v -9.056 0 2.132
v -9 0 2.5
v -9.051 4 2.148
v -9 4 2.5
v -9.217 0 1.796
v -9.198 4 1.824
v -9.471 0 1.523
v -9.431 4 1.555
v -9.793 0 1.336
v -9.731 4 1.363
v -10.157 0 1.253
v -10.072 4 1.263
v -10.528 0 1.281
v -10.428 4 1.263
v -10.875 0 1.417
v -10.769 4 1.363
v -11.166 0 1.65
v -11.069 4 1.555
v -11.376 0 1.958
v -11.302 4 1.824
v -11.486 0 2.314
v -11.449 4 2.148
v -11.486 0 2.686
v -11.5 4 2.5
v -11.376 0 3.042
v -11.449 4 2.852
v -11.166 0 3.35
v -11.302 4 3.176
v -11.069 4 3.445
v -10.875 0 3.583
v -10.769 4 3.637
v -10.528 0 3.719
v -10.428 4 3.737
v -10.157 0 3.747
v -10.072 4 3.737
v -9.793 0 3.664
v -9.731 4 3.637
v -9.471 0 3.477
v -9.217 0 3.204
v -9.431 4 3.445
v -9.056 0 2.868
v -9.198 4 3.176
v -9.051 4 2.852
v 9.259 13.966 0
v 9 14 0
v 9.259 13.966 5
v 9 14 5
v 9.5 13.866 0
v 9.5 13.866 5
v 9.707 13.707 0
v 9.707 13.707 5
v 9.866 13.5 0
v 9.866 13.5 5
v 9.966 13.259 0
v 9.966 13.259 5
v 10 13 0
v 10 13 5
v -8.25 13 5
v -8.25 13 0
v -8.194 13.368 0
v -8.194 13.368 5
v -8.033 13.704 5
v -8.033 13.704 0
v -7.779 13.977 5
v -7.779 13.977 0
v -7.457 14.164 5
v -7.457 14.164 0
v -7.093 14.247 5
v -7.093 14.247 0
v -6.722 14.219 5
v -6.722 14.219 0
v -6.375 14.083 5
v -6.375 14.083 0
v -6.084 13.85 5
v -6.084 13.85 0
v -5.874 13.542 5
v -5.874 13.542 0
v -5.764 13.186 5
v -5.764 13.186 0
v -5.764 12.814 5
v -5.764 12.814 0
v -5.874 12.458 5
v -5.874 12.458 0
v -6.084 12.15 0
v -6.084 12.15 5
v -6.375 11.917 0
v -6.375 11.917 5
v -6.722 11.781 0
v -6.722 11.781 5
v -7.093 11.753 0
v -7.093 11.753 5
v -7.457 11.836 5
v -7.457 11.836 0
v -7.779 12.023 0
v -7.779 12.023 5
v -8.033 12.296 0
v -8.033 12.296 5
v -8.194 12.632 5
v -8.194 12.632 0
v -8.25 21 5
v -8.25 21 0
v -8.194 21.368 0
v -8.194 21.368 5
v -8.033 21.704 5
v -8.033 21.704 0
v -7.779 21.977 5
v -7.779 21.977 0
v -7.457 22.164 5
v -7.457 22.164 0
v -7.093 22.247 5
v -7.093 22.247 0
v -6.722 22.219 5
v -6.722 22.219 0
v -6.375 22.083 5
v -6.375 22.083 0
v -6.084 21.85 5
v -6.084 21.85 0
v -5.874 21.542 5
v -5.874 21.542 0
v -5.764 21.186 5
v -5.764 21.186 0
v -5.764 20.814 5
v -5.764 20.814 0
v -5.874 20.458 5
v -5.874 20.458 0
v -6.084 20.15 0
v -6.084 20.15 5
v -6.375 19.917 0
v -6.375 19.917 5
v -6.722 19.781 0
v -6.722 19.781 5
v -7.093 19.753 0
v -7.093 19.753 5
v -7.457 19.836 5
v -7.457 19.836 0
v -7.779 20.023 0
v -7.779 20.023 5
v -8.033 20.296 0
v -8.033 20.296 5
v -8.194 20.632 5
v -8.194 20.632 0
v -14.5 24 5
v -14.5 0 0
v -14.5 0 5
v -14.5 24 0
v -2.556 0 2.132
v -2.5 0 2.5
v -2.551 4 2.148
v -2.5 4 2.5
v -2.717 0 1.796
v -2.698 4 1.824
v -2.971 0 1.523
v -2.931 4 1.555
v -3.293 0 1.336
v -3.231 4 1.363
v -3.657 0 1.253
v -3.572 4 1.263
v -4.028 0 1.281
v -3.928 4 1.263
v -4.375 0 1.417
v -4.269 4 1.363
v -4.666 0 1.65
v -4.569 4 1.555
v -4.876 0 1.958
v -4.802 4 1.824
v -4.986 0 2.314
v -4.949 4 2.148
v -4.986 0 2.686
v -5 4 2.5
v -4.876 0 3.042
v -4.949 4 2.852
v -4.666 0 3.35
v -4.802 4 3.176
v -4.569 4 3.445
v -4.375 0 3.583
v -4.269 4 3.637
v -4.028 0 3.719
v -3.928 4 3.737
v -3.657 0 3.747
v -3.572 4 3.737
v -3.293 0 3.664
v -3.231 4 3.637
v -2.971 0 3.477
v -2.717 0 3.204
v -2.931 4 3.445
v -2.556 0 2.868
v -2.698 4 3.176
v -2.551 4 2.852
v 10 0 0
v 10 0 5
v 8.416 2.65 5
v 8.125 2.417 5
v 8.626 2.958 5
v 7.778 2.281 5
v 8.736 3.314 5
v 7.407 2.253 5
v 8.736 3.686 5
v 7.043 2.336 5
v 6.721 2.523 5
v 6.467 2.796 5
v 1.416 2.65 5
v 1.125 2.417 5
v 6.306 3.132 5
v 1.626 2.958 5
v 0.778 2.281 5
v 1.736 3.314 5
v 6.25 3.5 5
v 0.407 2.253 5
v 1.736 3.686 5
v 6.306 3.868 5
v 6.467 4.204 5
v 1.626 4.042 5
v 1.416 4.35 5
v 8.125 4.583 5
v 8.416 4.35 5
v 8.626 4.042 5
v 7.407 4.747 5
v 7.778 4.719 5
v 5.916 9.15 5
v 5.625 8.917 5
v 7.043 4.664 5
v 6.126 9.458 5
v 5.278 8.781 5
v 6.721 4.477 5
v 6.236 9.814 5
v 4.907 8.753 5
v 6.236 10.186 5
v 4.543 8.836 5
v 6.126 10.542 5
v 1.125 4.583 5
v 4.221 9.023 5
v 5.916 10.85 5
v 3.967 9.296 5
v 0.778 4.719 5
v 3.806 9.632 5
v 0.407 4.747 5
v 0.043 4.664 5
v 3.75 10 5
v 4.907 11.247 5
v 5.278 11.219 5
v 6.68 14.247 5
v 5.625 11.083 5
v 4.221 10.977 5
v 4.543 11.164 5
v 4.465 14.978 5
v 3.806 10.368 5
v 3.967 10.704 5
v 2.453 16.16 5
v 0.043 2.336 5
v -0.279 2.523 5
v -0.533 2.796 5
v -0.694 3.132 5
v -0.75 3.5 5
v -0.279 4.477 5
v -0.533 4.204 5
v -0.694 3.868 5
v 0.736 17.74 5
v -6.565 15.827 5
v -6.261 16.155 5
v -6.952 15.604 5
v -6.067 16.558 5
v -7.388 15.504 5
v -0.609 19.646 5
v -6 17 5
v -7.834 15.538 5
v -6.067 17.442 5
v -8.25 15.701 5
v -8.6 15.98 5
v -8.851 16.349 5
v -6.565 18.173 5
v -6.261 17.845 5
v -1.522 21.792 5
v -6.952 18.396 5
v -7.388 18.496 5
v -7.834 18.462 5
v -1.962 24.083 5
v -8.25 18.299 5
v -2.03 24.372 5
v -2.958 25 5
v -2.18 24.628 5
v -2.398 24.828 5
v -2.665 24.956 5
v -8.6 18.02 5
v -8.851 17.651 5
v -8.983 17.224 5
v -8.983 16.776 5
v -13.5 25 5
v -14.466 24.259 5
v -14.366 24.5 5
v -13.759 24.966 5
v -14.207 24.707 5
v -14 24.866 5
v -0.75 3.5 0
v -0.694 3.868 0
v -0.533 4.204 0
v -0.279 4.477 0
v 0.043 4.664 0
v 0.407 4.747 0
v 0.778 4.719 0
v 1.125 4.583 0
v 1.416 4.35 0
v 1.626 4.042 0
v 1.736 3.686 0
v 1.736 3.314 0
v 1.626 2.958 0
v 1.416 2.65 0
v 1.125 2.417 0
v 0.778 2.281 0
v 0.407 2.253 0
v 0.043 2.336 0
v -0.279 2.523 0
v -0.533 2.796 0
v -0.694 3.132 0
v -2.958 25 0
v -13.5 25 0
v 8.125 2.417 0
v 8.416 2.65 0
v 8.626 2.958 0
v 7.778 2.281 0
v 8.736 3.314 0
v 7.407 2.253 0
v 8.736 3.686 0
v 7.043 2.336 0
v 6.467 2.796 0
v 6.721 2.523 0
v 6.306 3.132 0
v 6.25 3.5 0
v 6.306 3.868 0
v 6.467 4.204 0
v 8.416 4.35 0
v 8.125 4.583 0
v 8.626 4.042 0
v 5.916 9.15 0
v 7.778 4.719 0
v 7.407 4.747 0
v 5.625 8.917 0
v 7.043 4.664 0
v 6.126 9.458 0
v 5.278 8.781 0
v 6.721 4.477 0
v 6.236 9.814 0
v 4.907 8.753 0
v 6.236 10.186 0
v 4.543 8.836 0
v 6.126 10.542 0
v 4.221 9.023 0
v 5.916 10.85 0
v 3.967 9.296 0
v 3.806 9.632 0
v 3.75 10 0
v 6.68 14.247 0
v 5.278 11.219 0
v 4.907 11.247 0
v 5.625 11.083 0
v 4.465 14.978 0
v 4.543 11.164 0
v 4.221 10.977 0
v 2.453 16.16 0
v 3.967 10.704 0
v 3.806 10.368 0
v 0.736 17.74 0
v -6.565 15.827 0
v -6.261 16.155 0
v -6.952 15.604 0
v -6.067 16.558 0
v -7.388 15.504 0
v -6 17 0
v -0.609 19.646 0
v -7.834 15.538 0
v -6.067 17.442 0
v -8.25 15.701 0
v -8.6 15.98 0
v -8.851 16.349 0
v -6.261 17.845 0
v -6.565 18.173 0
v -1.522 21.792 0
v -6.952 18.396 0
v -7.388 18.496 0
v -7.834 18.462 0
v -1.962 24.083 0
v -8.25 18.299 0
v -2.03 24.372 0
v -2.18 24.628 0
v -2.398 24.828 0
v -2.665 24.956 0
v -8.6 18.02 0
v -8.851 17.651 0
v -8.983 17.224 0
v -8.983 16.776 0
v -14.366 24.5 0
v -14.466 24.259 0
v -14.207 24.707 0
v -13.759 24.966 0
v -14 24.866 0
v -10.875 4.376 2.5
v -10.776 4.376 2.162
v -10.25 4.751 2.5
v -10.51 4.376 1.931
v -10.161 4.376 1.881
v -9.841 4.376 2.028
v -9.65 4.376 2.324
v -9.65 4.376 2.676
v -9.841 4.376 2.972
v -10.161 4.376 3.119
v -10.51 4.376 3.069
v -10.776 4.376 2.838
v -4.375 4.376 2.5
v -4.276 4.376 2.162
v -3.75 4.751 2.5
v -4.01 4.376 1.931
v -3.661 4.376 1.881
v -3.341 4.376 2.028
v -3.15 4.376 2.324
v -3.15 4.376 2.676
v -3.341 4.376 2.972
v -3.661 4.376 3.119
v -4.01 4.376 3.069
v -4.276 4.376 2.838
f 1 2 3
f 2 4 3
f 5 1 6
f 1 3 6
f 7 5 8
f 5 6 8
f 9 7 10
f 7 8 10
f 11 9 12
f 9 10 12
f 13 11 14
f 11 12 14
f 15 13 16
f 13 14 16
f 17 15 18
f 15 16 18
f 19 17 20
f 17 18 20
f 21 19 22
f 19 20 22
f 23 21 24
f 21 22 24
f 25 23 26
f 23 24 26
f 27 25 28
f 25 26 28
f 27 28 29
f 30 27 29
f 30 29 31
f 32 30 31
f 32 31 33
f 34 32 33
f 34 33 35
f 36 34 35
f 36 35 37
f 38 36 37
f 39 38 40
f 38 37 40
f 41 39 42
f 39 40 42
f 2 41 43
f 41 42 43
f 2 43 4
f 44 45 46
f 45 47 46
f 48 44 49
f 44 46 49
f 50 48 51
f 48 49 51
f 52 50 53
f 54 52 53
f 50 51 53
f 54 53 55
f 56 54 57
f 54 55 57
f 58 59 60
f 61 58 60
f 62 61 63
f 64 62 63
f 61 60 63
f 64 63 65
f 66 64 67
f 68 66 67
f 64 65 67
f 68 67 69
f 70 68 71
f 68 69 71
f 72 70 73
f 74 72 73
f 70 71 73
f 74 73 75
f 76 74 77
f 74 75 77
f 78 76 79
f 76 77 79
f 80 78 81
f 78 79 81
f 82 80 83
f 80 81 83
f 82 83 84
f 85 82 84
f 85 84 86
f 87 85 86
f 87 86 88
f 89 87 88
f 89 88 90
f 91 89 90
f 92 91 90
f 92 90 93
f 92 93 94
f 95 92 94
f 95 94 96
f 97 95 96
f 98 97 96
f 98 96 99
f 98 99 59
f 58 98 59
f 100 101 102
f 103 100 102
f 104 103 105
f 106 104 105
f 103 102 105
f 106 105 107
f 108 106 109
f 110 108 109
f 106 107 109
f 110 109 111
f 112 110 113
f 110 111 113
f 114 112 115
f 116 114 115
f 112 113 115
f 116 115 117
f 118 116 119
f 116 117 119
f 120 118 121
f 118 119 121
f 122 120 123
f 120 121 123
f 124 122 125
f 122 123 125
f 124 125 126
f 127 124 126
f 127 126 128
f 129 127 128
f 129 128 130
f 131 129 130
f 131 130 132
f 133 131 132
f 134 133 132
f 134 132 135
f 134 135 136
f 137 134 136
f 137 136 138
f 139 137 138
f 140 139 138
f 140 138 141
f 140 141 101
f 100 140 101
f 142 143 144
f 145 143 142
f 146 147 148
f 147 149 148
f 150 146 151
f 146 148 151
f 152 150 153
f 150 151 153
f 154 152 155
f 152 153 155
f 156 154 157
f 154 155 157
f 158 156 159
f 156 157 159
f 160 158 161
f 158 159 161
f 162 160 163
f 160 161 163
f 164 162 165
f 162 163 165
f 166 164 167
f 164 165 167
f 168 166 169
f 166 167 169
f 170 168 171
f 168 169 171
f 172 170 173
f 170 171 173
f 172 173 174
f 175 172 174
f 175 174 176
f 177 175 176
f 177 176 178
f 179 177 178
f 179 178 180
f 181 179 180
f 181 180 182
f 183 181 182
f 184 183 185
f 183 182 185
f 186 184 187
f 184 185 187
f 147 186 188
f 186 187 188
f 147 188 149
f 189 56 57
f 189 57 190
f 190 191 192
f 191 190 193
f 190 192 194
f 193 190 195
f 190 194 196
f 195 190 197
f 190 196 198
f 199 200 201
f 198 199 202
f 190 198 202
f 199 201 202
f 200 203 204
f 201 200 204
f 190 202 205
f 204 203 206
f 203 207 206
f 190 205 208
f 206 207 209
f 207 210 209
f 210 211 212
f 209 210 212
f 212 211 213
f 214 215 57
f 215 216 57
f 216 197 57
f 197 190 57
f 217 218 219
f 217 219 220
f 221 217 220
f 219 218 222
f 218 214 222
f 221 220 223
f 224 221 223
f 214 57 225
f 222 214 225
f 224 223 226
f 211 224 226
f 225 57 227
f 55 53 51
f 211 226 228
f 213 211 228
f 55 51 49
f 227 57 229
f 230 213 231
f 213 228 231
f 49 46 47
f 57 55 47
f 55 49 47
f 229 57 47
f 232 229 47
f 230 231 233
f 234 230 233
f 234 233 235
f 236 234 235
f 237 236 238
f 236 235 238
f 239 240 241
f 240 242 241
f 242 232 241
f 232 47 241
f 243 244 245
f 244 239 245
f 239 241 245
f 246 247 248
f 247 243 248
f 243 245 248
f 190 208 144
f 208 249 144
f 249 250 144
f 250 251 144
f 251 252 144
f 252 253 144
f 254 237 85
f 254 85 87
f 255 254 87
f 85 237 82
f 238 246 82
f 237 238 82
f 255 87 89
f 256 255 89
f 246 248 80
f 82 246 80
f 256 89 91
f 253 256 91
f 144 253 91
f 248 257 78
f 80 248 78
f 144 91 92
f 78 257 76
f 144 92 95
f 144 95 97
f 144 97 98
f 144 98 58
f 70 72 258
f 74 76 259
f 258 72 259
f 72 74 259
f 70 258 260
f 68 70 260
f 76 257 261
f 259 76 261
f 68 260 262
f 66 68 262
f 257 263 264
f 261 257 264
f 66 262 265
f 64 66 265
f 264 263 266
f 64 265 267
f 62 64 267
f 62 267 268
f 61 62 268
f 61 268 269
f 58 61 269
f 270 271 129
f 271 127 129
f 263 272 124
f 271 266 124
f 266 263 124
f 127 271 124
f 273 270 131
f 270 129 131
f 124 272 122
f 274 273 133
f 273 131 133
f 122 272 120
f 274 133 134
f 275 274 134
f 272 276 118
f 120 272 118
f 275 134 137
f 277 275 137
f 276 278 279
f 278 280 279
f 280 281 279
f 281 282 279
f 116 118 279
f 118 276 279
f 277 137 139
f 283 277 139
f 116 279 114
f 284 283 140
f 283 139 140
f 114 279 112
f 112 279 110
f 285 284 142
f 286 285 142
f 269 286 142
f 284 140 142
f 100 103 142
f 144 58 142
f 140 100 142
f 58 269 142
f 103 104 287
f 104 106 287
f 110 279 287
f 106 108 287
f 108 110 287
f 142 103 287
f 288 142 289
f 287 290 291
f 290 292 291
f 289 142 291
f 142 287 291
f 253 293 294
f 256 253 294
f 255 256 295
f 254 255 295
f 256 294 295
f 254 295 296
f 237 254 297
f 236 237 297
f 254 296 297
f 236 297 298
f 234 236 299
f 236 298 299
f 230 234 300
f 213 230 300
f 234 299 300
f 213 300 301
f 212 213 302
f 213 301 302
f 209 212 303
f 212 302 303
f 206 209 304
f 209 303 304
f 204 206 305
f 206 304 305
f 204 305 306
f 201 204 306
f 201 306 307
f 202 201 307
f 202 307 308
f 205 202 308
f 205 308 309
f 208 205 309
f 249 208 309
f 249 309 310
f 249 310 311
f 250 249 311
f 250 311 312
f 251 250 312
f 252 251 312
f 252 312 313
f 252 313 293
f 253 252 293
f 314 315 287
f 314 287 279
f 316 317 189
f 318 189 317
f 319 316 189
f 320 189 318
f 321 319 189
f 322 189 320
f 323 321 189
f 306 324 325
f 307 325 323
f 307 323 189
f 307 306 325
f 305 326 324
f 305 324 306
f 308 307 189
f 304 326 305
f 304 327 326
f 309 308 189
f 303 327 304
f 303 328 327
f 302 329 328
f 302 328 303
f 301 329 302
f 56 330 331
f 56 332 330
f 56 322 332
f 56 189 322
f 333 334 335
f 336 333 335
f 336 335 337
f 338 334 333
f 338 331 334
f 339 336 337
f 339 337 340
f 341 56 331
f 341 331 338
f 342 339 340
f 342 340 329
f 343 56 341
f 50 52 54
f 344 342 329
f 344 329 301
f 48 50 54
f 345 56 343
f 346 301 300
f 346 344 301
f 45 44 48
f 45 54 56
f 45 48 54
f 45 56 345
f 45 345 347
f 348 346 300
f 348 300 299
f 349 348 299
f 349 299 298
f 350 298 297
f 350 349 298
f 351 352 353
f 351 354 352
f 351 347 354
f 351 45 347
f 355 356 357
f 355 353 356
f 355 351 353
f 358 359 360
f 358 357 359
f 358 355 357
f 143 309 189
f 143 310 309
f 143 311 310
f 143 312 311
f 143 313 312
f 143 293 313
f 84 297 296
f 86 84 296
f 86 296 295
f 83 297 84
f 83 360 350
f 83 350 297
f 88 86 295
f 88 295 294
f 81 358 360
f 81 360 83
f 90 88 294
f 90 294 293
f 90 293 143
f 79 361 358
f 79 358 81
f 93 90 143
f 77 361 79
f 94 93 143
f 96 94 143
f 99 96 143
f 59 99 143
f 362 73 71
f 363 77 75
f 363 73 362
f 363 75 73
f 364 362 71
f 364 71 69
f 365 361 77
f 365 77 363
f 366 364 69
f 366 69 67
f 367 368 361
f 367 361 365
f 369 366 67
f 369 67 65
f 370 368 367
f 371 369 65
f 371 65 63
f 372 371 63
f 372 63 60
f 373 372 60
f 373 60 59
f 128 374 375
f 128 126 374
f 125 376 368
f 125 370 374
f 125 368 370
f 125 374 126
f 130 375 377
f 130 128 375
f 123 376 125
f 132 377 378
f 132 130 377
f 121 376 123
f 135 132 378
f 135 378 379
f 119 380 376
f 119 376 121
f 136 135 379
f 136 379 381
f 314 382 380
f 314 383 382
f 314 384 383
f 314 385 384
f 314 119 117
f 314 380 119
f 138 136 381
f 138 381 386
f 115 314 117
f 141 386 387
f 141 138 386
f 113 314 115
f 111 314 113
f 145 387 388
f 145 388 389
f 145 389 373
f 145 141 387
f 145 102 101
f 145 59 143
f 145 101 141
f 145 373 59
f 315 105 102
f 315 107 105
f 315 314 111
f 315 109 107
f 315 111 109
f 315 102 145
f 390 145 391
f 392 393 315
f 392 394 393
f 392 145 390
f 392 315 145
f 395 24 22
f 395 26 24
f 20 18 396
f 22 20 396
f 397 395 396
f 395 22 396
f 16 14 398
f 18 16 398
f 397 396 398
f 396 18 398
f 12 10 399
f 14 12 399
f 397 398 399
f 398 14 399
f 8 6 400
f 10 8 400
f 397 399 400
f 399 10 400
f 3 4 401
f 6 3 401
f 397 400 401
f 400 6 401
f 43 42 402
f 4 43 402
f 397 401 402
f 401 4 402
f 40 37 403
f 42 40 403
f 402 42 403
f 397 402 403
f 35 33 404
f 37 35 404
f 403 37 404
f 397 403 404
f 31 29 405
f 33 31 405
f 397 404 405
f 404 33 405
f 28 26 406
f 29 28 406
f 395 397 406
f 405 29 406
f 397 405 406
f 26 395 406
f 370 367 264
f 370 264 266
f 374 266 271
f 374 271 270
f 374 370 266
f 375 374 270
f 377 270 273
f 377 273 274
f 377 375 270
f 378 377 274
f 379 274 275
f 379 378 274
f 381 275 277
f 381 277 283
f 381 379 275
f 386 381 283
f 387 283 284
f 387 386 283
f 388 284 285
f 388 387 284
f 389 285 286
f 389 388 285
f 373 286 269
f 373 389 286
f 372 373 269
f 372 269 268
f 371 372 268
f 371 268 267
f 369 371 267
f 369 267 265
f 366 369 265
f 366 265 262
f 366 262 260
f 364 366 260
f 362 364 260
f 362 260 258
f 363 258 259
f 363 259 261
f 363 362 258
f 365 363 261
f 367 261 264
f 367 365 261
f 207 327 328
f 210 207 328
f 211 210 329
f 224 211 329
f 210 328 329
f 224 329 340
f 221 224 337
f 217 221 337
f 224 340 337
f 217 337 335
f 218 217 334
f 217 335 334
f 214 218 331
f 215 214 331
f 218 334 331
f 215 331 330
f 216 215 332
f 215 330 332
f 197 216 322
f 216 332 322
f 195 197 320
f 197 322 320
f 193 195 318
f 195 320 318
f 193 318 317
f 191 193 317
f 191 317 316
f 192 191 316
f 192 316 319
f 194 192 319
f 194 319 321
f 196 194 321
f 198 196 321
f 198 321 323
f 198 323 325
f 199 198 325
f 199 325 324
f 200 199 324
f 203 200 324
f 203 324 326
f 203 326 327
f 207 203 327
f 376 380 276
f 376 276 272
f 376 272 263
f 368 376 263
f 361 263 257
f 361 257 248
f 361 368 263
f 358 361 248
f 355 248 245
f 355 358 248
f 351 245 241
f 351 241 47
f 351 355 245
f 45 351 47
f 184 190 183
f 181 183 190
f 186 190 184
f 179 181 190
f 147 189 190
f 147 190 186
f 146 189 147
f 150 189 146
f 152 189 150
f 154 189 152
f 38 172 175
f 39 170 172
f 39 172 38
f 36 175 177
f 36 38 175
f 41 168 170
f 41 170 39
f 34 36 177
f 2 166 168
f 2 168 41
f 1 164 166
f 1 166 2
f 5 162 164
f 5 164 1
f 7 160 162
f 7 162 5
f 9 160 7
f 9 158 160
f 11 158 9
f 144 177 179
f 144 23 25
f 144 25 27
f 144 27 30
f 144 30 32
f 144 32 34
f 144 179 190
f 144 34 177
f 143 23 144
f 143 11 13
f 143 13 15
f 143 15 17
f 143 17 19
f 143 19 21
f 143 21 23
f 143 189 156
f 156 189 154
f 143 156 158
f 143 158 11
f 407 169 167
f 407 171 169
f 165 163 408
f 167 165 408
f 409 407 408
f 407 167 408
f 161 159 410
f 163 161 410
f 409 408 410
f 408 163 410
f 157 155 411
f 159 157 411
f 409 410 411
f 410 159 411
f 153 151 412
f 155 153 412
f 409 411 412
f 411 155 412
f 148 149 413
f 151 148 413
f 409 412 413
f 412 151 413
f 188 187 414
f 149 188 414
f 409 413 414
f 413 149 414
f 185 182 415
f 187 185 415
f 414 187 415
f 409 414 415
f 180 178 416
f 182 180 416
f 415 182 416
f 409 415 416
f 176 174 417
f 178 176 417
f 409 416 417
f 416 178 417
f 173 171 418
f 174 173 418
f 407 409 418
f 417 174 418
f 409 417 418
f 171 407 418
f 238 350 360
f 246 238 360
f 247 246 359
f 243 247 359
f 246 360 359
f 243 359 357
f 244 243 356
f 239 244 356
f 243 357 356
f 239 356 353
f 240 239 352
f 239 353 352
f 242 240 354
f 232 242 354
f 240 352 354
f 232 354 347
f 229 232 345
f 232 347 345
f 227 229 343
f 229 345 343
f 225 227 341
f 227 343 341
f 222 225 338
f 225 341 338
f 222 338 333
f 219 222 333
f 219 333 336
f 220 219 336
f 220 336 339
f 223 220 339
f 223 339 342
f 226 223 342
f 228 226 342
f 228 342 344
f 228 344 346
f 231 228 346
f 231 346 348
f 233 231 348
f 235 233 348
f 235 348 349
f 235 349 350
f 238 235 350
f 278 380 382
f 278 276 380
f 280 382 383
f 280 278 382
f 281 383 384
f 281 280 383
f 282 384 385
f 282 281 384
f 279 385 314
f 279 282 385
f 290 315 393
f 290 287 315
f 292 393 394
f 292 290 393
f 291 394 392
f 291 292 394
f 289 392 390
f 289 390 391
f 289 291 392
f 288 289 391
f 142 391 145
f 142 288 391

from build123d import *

# Parameters (mm, degrees)
SKETCH1_R                   = 1.5
BOSS_EXTRUDE1_DEPTH         = 5
TAP_DRILL_FOR_M3_TAP1_D     = 2.5
TAP_DRILL_FOR_M3_TAP2_D     = 2.5
TAP_DRILL_FOR_M3_TAP2_DEPTH = 4
TAP_DRILL_FOR_M3_TAP2_TIP   = 0.751075774
FILLET1_R                   = 1


with BuildPart() as part:
    # Sketch1 → Boss-Extrude1 (new body)
    with BuildSketch(Plane.XY):
        with BuildLine():
            Line((-10, 25), (-2, 25))
            ThreePointArc((-2, 25), (1.221825407, 17.221825407), (9, 14))
            Line((9, 14), (10, 14))
            Line((10, 14), (10, 0.5))
            Line((10, 0.5), (10, 0))
            Line((10, 0), (-10, 0))
            Line((-10, 0), (-14.5, 0))
            Line((-14.5, 0), (-14.5, 25))
            Line((-14.5, 25), (-10, 25))
        make_face()
        with Locations((-7.5, 17)):
            Circle(SKETCH1_R, mode=Mode.SUBTRACT)
    extrude(amount=BOSS_EXTRUDE1_DEPTH)

    # Tap Drill for M3 Tap1 (through all)
    with Locations(Plane.XY.offset(5)):
        with Locations((-7, 13), (-7, 21), (5, 10), (0.5, 3.5), (7.5, 3.5)):
            Hole(TAP_DRILL_FOR_M3_TAP1_D / 2)

    # Tap Drill for M3 Tap2
    with Locations(Plane(origin=(0, 0, 0), x_dir=(-1, 0, 0), z_dir=(0, -1, 0))):
        with Locations((3.75, -2.5), (10.25, -2.5)):
            Hole(TAP_DRILL_FOR_M3_TAP2_D / 2, depth=TAP_DRILL_FOR_M3_TAP2_DEPTH)
            with Locations((0, 0, -(TAP_DRILL_FOR_M3_TAP2_DEPTH + TAP_DRILL_FOR_M3_TAP2_TIP / 2))):  # 118° drill point
                Cone(0, TAP_DRILL_FOR_M3_TAP2_D / 2, TAP_DRILL_FOR_M3_TAP2_TIP, mode=Mode.SUBTRACT)

    # Fillet1
    fillet1_edges = [part.edges().sort_by_distance(p)[0] for p in [
        (-14.5, 25, 2.5),
        (-2, 25, 2.5),
        (10, 14, 2.5),
    ]]
    fillet(fillet1_edges, radius=FILLET1_R - 0.0001)  # a hair under: the kernel refuses the full size


solid = part.part
